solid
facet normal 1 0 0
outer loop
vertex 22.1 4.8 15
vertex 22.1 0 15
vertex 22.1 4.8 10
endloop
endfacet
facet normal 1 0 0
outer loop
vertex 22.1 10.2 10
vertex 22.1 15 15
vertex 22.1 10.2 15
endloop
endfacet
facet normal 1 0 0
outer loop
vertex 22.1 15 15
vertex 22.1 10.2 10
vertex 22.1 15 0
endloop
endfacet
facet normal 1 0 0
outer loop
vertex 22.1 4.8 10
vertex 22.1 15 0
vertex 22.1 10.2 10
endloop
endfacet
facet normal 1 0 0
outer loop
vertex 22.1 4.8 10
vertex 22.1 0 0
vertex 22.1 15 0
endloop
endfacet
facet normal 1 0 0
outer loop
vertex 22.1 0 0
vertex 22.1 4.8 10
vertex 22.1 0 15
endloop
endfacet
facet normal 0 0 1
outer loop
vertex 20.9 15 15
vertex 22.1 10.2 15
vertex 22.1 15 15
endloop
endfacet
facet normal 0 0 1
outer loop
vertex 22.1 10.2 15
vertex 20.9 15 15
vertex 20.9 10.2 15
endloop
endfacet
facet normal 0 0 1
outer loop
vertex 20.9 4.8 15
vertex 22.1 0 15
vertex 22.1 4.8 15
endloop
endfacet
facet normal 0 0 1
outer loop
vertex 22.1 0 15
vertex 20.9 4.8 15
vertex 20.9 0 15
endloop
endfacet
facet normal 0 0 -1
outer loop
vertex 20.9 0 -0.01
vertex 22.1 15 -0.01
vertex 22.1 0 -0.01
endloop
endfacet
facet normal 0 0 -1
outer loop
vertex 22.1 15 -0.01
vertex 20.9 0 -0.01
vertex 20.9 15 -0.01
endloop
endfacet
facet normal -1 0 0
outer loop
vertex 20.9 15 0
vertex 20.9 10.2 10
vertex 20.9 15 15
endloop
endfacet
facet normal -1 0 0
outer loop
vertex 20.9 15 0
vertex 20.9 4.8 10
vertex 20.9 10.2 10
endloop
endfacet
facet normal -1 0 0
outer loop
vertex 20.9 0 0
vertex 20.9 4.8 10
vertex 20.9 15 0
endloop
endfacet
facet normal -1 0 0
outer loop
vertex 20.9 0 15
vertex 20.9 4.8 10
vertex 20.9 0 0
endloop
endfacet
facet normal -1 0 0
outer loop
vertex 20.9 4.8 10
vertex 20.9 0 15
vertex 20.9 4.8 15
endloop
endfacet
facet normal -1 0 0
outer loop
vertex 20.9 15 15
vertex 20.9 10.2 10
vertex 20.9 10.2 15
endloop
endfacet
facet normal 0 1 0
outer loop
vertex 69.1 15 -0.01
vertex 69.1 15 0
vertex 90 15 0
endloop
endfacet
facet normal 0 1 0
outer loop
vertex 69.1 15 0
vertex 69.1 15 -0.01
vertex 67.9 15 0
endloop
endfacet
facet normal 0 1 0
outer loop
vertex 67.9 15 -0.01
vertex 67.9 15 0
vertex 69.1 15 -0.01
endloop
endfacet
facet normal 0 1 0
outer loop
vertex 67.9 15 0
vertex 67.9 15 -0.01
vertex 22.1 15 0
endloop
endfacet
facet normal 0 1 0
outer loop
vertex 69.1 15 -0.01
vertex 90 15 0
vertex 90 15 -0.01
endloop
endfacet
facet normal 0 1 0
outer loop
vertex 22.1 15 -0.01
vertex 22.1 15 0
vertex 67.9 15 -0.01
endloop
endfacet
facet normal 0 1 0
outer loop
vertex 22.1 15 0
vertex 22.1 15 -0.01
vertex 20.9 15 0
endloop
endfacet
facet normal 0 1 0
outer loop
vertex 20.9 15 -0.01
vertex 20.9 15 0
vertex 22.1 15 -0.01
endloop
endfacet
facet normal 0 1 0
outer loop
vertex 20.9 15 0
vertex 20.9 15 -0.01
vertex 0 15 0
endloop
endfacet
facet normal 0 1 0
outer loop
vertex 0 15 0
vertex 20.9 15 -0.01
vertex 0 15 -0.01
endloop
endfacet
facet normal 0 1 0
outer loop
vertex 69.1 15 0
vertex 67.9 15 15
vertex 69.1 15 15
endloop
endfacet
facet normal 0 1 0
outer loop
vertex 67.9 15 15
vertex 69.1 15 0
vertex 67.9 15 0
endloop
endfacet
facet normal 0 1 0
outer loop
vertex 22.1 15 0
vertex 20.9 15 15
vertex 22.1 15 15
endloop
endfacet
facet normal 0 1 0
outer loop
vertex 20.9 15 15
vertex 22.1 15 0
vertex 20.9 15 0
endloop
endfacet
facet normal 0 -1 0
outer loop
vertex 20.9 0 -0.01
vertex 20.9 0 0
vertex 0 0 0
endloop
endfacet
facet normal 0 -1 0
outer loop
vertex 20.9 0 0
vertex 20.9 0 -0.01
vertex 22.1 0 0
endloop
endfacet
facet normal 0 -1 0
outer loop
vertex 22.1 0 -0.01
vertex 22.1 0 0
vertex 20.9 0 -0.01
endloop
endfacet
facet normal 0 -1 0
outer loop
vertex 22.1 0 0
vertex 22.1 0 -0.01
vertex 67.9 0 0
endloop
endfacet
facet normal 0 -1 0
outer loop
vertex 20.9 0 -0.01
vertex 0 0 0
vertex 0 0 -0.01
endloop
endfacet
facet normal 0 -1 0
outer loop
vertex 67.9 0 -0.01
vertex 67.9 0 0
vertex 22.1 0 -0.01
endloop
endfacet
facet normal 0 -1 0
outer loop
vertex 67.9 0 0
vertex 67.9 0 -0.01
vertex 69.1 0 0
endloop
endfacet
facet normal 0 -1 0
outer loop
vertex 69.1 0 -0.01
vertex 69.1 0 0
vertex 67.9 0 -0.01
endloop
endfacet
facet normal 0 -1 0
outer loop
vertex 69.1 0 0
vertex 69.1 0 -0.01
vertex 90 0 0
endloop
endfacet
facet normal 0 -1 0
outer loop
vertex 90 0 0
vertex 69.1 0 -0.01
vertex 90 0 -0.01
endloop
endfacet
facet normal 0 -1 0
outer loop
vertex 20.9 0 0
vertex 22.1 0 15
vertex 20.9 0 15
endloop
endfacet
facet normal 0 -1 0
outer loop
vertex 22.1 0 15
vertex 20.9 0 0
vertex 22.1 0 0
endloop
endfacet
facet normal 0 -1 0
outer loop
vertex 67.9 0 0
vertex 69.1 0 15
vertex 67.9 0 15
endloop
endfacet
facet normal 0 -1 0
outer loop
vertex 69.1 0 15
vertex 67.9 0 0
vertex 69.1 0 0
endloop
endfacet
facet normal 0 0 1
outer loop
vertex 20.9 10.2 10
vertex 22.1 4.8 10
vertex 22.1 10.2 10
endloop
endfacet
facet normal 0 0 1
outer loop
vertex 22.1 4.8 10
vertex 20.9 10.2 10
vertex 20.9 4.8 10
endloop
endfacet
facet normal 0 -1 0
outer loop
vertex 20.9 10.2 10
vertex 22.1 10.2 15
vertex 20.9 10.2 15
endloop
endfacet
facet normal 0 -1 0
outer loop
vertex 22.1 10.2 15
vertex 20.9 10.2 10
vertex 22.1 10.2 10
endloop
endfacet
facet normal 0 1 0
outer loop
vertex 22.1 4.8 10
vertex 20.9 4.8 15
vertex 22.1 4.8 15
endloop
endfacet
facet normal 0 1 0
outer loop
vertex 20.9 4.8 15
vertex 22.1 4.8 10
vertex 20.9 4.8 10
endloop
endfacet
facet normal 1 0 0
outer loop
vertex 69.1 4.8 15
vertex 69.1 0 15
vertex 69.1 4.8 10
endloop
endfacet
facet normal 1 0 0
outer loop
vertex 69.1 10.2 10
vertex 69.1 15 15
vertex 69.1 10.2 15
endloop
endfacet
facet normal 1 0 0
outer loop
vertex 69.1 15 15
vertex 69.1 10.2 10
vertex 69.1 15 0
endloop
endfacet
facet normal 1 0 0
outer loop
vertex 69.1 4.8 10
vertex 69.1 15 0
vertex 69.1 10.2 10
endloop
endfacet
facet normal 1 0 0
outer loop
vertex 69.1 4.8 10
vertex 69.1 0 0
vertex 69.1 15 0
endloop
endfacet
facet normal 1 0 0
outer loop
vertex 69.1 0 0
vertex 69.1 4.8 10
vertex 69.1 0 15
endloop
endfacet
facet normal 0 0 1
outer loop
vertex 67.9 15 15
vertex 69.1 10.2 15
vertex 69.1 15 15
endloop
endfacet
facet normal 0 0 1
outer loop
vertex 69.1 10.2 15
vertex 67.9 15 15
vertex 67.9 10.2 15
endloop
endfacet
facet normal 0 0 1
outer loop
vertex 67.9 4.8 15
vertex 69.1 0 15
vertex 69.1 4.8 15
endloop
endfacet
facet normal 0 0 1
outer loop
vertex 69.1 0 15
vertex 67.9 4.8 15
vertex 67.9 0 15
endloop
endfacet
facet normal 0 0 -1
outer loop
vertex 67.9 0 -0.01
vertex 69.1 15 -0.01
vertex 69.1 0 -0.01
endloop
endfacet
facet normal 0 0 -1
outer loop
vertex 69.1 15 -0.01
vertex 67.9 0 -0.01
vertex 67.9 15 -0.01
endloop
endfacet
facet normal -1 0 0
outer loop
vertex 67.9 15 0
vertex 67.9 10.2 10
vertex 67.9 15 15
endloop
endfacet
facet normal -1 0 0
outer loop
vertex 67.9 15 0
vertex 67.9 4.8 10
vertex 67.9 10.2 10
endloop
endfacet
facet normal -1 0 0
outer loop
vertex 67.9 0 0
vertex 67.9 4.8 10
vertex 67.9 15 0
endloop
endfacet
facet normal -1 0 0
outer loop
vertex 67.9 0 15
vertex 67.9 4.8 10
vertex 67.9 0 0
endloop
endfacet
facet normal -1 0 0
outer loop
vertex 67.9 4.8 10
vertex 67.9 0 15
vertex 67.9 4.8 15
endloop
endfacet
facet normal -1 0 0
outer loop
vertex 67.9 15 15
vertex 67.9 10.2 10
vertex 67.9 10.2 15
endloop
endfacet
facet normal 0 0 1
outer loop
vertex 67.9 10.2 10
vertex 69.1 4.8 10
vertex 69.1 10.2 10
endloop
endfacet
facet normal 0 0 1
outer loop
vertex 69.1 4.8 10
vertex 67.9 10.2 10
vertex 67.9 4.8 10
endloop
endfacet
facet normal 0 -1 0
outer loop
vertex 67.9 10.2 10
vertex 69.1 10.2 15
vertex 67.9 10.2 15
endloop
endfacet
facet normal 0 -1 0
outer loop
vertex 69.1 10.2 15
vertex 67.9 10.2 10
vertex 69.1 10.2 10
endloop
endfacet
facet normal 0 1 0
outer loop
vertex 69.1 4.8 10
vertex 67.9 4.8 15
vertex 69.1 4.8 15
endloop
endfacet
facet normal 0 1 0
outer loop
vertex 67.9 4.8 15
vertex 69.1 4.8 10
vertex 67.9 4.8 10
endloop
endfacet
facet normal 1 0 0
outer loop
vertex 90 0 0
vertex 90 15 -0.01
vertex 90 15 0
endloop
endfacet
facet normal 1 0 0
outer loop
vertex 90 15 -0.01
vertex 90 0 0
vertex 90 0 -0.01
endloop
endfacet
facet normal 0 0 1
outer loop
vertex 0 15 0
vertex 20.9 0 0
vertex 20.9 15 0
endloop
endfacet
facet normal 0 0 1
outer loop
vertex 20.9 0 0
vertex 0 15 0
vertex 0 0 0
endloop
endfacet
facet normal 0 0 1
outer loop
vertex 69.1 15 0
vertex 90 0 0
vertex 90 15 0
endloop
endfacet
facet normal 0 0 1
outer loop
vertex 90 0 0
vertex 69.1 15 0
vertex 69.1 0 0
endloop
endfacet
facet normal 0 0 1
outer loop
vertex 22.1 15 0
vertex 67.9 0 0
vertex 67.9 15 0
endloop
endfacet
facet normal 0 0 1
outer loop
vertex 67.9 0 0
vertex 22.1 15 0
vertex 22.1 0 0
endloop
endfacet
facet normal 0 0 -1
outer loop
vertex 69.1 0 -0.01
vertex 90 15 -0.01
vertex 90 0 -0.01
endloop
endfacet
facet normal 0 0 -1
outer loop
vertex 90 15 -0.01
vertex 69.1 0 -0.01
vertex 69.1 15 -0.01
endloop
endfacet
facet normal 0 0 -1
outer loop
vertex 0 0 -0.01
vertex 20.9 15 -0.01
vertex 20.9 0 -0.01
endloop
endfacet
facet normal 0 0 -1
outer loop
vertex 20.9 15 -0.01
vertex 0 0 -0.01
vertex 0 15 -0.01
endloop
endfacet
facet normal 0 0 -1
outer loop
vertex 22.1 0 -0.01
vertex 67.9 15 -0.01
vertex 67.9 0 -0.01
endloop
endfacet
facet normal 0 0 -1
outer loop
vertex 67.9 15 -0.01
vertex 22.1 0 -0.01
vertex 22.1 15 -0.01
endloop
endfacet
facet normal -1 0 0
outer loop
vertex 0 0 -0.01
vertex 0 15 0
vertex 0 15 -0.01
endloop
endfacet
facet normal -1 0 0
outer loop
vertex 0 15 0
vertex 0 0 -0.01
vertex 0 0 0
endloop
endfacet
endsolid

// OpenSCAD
// file: ../Base/Rotation.scad
// Fischertechnik Box Foundation
// Geometry Helpers Rotation

include <PlacementOptions.scad>

// getRotatedSpace(space, rotation=NoRotation)
// Rotates the space dependent on the specified rotation

function getRotatedSpace(space, rotation=NoRotation) = [
    (rotation == Rotate90 || rotation == Rotate270) ? space.y : space.x,
    (rotation == Rotate90 || rotation == Rotate270) ? space.x : space.y
];

// Rotates the given space around the fixed left lower corner
// space = the space the children needs as width/depth list [width,depth]
// rotation = 0 Rotate0 degrees, 1 Rotate90 degrees, 2 Rotate180 degrees, 3 Rotate270 degrees (equivalent to -90)

module RotateFix(space, rotation=NoRotation) {
    dy = (rotation == Rotate0 || rotation == Rotate270) ? 0 :
        (rotation == Rotate90) ? space.x :
        space.y;
    dx = (rotation < Rotate180) ? 0 :
        (rotation == Rotate180) ? space.x :
        space.y;
    
    translate([dx, dy, 0])
        rotate([0, 0, rotations[rotation]])
            children();
}
// file: ../Base/Alignment.scad
// Fischertechnik Box Foundation
// Geometry Helpers Alignment

include <PlacementOptions.scad>

// getAlignedX(elementWidth, spaceWidth, align=AlignRight, offset=0)
// Gets the aligned X offset of an element with the given
// width in the given space.
// elementWidth = The width of the element to positon
// spaceWidth = The space where the element should be aligned
// align = 0 AlignLeft, 1 AlignCenter, 2 AlignRight
// offset = an optional offset from the aligned position. When
// aligned left or centered, then positive values are in X direction.
// When aligned right then positive values are in negative X direction.

function getAlignedX(elementWidth, spaceWidth, align=AlignRight, offset=0) =
    (align == AlignLeft) ?
        offset :
        ((align == AlignCenter) ?
        (spaceWidth - elementWidth)/2 + offset :
        spaceWidth - offset - elementWidth);

// getAlignedY(elementDepth, spaceDepth, align=AlignTop, offset=0)
// Gets the aligned Y offset of an element with the given
// depth in the given space.
// elementDepth = The depth of the element to positon
// spaceDepth = The space where the element should be aligned
// align = 0 AlignBottom, 1 AlignCenter, 2 AlignTop
// offset = an optional offset from the aligned position. When
// aligned bottom or centered, then positive values are in Y direction.
// When aligned top then positive values are in negative Y direction.

function getAlignedY(elementDepth, spaceDepth, align=AlignTop, offset=0) =
    (align == AlignBottom) ?
        offset :
        ((align == AlignCenter) ?
        (spaceDepth - elementDepth)/2 + offset :
        spaceDepth - offset - elementDepth);
// file: ../Base/PlacementOptions.scad
// Fischertechnik Box Foundation
// Placement Options

// Alignment
NoAlign = 0;
AlignLeft = 1;
AlignBottom = 2;
AlignCenter = 3;
AlignRight = 4;
AlignTop = 5;

// Element rotation degree steps
rotations = [0, -90, -180, -270];

// Rotation
NoRotation = 0;
Rotate0 = 0;
Rotate90 = 1;
Rotate180 = 2;
Rotate270 = 3;

// Docking (seen from above)
NoDock = -1;
DockLeft = 0;
DockTop = 1;
DockRight = 2;
DockCorner = 2;
DockBottom = 3;

// Web corners
LowerLeft = 0;
UpperLeft = 1;
UpperRight = 2;
LowerRight = 3;

// Web position relative to corner
LeftOfCorner = 0;
RightOfCorner = 1;
// file: ../Base/Boxes.scad
// Fischertechnik Box Foundation
// Pre-designed Boxes

use <Constants.scad>

include <PlacementOptions.scad>

box190Width = 190;
box190Depth = 130;
box130Width = 130;
box130Depth = 95;

// Values are from an original ec3 box
topBottomDifference = 1.5;
outerHeight = 40;
baseThickness = 1.8;
innerHeight = outerHeight - baseThickness;
stackExcess = 5.7;
radius = 3.5;
wallThickness = 1.5;
tolerance = 0.2;

boxWallThickness = wallThickness;
boxBaseThickness = baseThickness;
boxWebWidth = 3.0;

// getBoxWallThickness()
// Gets the wall thickness of a Fischertechnik Box
function getBoxWallThickness() = boxWallThickness;

// getBoxUsageHeight(height = 38.2)
// Gets the usable height of a Fischertechnik box
// height = Outer height of the box from the bottom to the upper edge.
function getBoxUsageHeight(height = outerHeight) = height - baseThickness - stackExcess;

// getBoxInnerHeight()
// Gets the inner height of a Fischertechnik box, including the stack excess
function getBoxInnerHeight() = innerHeight;

// getBoxBaseThickness()
// Gets the thickness of the Fischertechnik box base.
function getBoxBaseThickness() = boxBaseThickness;

// getBoxWebWidth()
// Gets the width of a box web
function getBoxWebWidth() = boxWebWidth;

// getBox190Space()
// Gets the usable inner space of a Box 190 as an x/y-list
function getBox190Space() = [
    box190Width - 2*getBoxWallThickness() - topBottomDifference, 
    box190Depth - 2*getBoxWallThickness() - topBottomDifference ];

// RoundedCornerPlate(width, depth, height, radius)
// Creates a body plate with rounded corners for a box. Used
// also to create the complete box with the hull module.
// width = Width of the plate
// depth = depth of the plate 
// height = thickness of the plate
// radius = radius of the rounded corner
module RoundedCornerPlate(width, depth, height, radius) {
    translate([radius, radius])
    hull() {
        w = width-2*radius;
        d = depth-2*radius;
        cube([w, d, height]);
        cylinder(height, r=radius, $fn=getFragments());
        translate([w, 0])
            cylinder(height, r=radius, $fn=getFragments());
        translate([w, d])
            cylinder(height, r=radius, $fn=getFragments());
        translate([0, d])
            cylinder(height, r=radius, $fn=getFragments());
    }
}

// BoxBase(width, depth)
// Creates an empty stackable Fischertechnik compatible box
// width = Outer width of the box (190, 130, ...)
// depth = Outer depth of the box (130, 95, ...)

module BoxBase(width, depth, height=outerHeight) {    
    thinPlate = 0.01;

    innerHeight = height - baseThickness;    
    
    module Body(tolerance=tolerance) {
        hull() {
            // Bottom with tolerance to fit into the original boxes when stacked
            translate([-wallThickness+tolerance, -wallThickness+tolerance, -baseThickness])
                RoundedCornerPlate(width-topBottomDifference-2*tolerance, depth-topBottomDifference-2*tolerance, thinPlate, radius);
            
            // Top
            translate([-wallThickness-topBottomDifference/2, -wallThickness-topBottomDifference/2, innerHeight-thinPlate])
                RoundedCornerPlate(width, depth, thinPlate, radius);
         }
    }

    module Cutoff() {
        hull() {
            coWidth = width - 2*wallThickness;
            coDepth = depth - 2*wallThickness;
            
            // Bottom
            RoundedCornerPlate(coWidth-topBottomDifference, coDepth-topBottomDifference, thinPlate, radius);

            // Top
            translate([-topBottomDifference/2, -topBottomDifference/2, innerHeight+thinPlate]) 
                RoundedCornerPlate(coWidth, coDepth, thinPlate, radius);
        }
    }
    
    difference() {        
        Body();
        Cutoff();
        stackOffset = innerHeight - stackExcess;
        translate([0, 0, stackOffset + baseThickness])
            Body(tolerance=0);
    }
}

// Creates the Fischertechnik empty box 130x190 mm and places it at position 0,0
// 190x130 are the outer sizes, the inner space is slightly smaller. Use getBox190Space() to get the inner sizes.
// The box is positioned that the usable inner space is at the 0,0,0 position.

module Box190() {
    BoxBase(box190Width, box190Depth);
}

// Gets the usable inner space of a Box 130 as an x/y-list
function getBox130Space() = [
    box130Width - 2*getBoxWallThickness() - topBottomDifference, 
    box130Depth - 2*getBoxWallThickness() - topBottomDifference ];

// Creates the Fischertechnik empty box 95x130 mm and places it at position 0,0
// 190x130 are the outer sizes, the inner space is slightly smaller. Use getBox190Space() to get the inner sizes.
// The box is positioned that the usable inner space is at the 0,0,0 position.

module Box130() {
    BoxBase(box130Width, box130Depth);
}

// Creates a web at the specified box walls
// corner 0 = LowerLeft, 1 = UpperLeft, 2 = UpperRight, 3 = LowerRight
// side 0 = LeftOfCorner, 1 = RightOfCorner
// distance = Distance in mm from the corner
// boxSpace = inner width and depth of the box (default: Box 190)
// webWidth = length of the web (default is 3 mms)
// webThickness = thickness of the web (default is 1 mm)
// height = Height of the web (standard is getBoxUsageHeight())
// sink = How much of the web is sunk into the wall

module BoxWeb(
    corner, 
    side, 
    distance, 
    boxSpace=getBox190Space(), 
    webWidth=getBoxWebWidth(), 
    webThickness=1.0, 
    height=getBoxUsageHeight(),
    sink = getBoxWallThickness()/2) {
    width = (corner % 2 == 0) ? 
            (side == LeftOfCorner ? webWidth : webThickness) :
            (side == LeftOfCorner ? webThickness : webWidth);

    depth = (corner % 2 == 0) ? 
            (side == RightOfCorner ? webWidth : webThickness) :
            (side == RightOfCorner ? webThickness : webWidth);
    
    xDiff = corner == LowerLeft ? 
                (side == LeftOfCorner ? -sink : distance) :
            (corner == UpperLeft ?                
                (side == LeftOfCorner ? distance : -sink) :
            (corner == UpperRight ?
                (side == LeftOfCorner ? boxSpace.x-webWidth+sink : boxSpace.x-distance-webThickness) :
                (side == LeftOfCorner ? boxSpace.x-distance-webThickness: boxSpace.x-webWidth+sink)));

    yDiff = corner == LowerLeft ? 
                (side == RightOfCorner ? -sink : distance) :
            (corner == UpperLeft ?
                (side == RightOfCorner ? boxSpace.y-distance-webThickness : boxSpace.y-webWidth+sink) :
            (corner == UpperRight ?
                (side == RightOfCorner ? boxSpace.y-webWidth+sink : boxSpace.y-distance-webThickness) :
                (side == RightOfCorner ? distance : -sink)));
    
    translate([xDiff, yDiff, -getExcess()])
        cube([width, depth, height + 2*getExcess()]);
}
// file: ../Base/Placement.scad
// Fischertechnik Box Foundation
// Geometry Helpers Placement

use <Constants.scad>
use <Alignment.scad>
use <Rotation.scad>
use <Boxes.scad>

include <PlacementOptions.scad>

// Place(x=0, y=0, elementSpace=[0,0], alignX=AlignLeft, alignY=AlignBottom, rotation=Rotate0, boxSpace=getBox190Space())
// Places the child at the specified position
// y = Y-Position. This is a relative position when an X aligment is specified.
// x = X-Position. This is a relative position when an Y aligment is specified.
// elementSpace = space of the element to be placed [x,y]
// alignX = -1=NoAlign, 0 AlignLeft, 1 AlignCenter, 3 AlignRight (elementSpace and boxSpace required!)
// alignY = -1=NoAlign, 2 AlignBottom, 1 AlignCenter, 4 AlignTop (elementSpace and boxSpace required!)
// rotation = 0 Rotate0 0 degrees, 1 Rotate90 90 degrees, 
// 2 Rotate180 180 degrees, 3 Rotate270 270 degrees (equivalent to -90)
// boxSpace = Inner space of the box where the placement occurs [x,y] - default is Box 190x130 inner space

module Place(x=0, y=0, elementSpace=[0,0], 
  alignX=AlignLeft, alignY=AlignBottom, 
  rotation=NoRotation, boxSpace=getBox190Space()) {

    module Position(x, y, space, rotation=Rotate0) {
        translate([x, y, 0])
            RotateFix(space, rotation)
                children();
    }

    space = getRotatedSpace(elementSpace, rotation);
    alignedX = getAlignedX(space.x, boxSpace.x, alignX, x);
    alignedY = getAlignedY(space.y, boxSpace.y, alignY, y);
    Position(alignedX, alignedY, elementSpace, rotation)
        children();
}

// Center(space=getBox130Space(), elementSpace=[0,0])
// space = Space where the children is centered. For cylinder use centered=true and no elementSpace.
// elementSpace = space of the element to be centered [x,y]

module Center(space=getBox190Space(), elementSpace=[0,0]) {
    Place(elementSpace=elementSpace, boxSpace=space, alignX=AlignCenter, alignY=AlignCenter)
        children();
}

// CenterHorizontal(width=0, y=0, offset=0, space=getBox130Space())
// width = Width of the element to be placed.
// y = Y position of the element
// offset = Offset from the center position (negative will be left of the center)
// space = Space where the element is placed

module CenterHorizontal(width=0, y=0, offset=0, space=getBox190Space()) {
    Place(x=offset, y=y, elementSpace=[width, 0], boxSpace=space, alignX=AlignCenter)
        children(0);
}

// CenterVertical(depth=0, x=0, offset=0, space=getBox130Space())
// depth = Depth of the element to be placed.
// x = X position of the element
// offset = Offset from the center position (negative will be down of the center)
// space = Space where the element is placed

module CenterVertical(depth=0, x=0, offset=0, space=getBox190Space()) {
    Place(x=x, y=offset, elementSpace=[0, depth], boxSpace=space, alignY=AlignCenter)
        children(0);
}

// getIsVertical(align)
// True if the specified alignment needs a vertical orientation for a divider (AlignRight, AlignLeft)

function getIsVertical(align) = (align == AlignRight || align == AlignLeft);

// getIsHorizontal(align)
// True if the specified alignment needs a horizontal orientation for a divider (AlignTop, AlignBottom)

function getIsHorizontal(align) = (align == AlignTop || align == AlignBottom);
// file: ../Base/Constants.scad
// Fischertechnik Box Foundation
// Constants

// Constant values necessary for multiple elements

// Base constants
dividerThickness = 1.2;
excess = 0.01;
fragments = 90;
tolerance = 0.8;

// Gets the thickness of a divider 
function getDividerThickness() = dividerThickness;

// Gets the excess that is used to merge walls into each other
function getExcess() = excess;

// Gets amount of fragments of a cylinder
function getFragments() = fragments;

// Gets the inner tolerance of a frame to each side
function getTolerance() = tolerance;


// Fischertechnik specific constants
axisDiameter = 4;
axisBottomDiameter = axisDiameter + 1;
axisTolerance = 0.2;

// Gets axis diameter of Fischertechnik axis
function getAxisDiameter() = axisDiameter;

// Gets axis diameter tolerance (subtracted for element axis)
function getAxisTolerance() = axisTolerance;

// Gets the axis diameter for standing axis
function getStandAxisDiameter() = getAxisDiameter() - getAxisTolerance();

// Gets axis bottom diameter for thicker part at the bottom
function getAxisBottomDiameter() = axisBottomDiameter;

pinHeight = 2.5;

// gets the height of a connecting pin
function getPinHeight() = pinHeight;

standardEdgeDistance = 2.5;
standardWebDistance = 11.5;
standardCornerLength = 15;

// gets the standard distance to the wall of the box for dockable frames with webs
function getStandardEdgeDistance() = standardEdgeDistance;

// gets the standard distance of each web to the corner of the dockable frame
function getStandardWebDistance() = standardWebDistance;

// gets the standard length of the corner walls of a dockable frame
function getStandardCornerLength() = standardCornerLength;

tubeWallFactor = 0.8;

// gets the wall thickness of a tube.
function getTubeWallThickness() = tubeWallFactor * getDividerThickness();

smallPartsFrameHeight = 20;

// gets the frame height for docked small parts boxes.
function getSmallPartsFrameHeight() = smallPartsFrameHeight;

hubRingDiameter = 19.5;
hubRingLevelDiameter = 21;

// gets the diameter of a tube matching the inner ring of a wheel
function getHubRingDiameter() = hubRingDiameter;

// gets the diameter of a hub tube with a thicker diameter
function getHubRingLevelDiameter() = hubRingLevelDiameter;
// main file
// Fischertechnik Box Library
// Holder for Link Beam
// 38418

use <../Base/Constants.scad>
use <../ModelBase/Simple.scad>

/* [Hidden] */
width = 90;
depth = 15;

// getHolderLinkBeamSpace()
// Gets the width and depth of the space the lonk beam holder needs.
function getHolderLinkBeamSpace() = [width, depth];

// HolderLinkBeam()
// Holder for a Link Beam

module HolderLinkBeam() {
    height = 15 + getExcess();
    distance = 45 + getTolerance();
    cutoffDepth = 5.4;
    cutoffHeight = 5;
    
    module Holder(xOffset) {
        midOffset = (depth - cutoffDepth) / 2;
        
        translate([xOffset, 0, -getExcess()]) {
            difference() {
                cube([getDividerThickness(), depth, height]);
                translate([-getExcess()/2, midOffset, height - cutoffHeight])
                    cube([getDividerThickness()*2, cutoffDepth, cutoffHeight + getExcess()]);
            }
        }
    }

    Space([width, depth, height]);
    
    xOffsetLeft = (width - distance) / 2 - getDividerThickness();
    Holder(xOffsetLeft);

    xOffsetRight = width - xOffsetLeft - getDividerThickness();
    Holder(xOffsetRight);
}

// Test
color("lightgray")
HolderLinkBeam();
